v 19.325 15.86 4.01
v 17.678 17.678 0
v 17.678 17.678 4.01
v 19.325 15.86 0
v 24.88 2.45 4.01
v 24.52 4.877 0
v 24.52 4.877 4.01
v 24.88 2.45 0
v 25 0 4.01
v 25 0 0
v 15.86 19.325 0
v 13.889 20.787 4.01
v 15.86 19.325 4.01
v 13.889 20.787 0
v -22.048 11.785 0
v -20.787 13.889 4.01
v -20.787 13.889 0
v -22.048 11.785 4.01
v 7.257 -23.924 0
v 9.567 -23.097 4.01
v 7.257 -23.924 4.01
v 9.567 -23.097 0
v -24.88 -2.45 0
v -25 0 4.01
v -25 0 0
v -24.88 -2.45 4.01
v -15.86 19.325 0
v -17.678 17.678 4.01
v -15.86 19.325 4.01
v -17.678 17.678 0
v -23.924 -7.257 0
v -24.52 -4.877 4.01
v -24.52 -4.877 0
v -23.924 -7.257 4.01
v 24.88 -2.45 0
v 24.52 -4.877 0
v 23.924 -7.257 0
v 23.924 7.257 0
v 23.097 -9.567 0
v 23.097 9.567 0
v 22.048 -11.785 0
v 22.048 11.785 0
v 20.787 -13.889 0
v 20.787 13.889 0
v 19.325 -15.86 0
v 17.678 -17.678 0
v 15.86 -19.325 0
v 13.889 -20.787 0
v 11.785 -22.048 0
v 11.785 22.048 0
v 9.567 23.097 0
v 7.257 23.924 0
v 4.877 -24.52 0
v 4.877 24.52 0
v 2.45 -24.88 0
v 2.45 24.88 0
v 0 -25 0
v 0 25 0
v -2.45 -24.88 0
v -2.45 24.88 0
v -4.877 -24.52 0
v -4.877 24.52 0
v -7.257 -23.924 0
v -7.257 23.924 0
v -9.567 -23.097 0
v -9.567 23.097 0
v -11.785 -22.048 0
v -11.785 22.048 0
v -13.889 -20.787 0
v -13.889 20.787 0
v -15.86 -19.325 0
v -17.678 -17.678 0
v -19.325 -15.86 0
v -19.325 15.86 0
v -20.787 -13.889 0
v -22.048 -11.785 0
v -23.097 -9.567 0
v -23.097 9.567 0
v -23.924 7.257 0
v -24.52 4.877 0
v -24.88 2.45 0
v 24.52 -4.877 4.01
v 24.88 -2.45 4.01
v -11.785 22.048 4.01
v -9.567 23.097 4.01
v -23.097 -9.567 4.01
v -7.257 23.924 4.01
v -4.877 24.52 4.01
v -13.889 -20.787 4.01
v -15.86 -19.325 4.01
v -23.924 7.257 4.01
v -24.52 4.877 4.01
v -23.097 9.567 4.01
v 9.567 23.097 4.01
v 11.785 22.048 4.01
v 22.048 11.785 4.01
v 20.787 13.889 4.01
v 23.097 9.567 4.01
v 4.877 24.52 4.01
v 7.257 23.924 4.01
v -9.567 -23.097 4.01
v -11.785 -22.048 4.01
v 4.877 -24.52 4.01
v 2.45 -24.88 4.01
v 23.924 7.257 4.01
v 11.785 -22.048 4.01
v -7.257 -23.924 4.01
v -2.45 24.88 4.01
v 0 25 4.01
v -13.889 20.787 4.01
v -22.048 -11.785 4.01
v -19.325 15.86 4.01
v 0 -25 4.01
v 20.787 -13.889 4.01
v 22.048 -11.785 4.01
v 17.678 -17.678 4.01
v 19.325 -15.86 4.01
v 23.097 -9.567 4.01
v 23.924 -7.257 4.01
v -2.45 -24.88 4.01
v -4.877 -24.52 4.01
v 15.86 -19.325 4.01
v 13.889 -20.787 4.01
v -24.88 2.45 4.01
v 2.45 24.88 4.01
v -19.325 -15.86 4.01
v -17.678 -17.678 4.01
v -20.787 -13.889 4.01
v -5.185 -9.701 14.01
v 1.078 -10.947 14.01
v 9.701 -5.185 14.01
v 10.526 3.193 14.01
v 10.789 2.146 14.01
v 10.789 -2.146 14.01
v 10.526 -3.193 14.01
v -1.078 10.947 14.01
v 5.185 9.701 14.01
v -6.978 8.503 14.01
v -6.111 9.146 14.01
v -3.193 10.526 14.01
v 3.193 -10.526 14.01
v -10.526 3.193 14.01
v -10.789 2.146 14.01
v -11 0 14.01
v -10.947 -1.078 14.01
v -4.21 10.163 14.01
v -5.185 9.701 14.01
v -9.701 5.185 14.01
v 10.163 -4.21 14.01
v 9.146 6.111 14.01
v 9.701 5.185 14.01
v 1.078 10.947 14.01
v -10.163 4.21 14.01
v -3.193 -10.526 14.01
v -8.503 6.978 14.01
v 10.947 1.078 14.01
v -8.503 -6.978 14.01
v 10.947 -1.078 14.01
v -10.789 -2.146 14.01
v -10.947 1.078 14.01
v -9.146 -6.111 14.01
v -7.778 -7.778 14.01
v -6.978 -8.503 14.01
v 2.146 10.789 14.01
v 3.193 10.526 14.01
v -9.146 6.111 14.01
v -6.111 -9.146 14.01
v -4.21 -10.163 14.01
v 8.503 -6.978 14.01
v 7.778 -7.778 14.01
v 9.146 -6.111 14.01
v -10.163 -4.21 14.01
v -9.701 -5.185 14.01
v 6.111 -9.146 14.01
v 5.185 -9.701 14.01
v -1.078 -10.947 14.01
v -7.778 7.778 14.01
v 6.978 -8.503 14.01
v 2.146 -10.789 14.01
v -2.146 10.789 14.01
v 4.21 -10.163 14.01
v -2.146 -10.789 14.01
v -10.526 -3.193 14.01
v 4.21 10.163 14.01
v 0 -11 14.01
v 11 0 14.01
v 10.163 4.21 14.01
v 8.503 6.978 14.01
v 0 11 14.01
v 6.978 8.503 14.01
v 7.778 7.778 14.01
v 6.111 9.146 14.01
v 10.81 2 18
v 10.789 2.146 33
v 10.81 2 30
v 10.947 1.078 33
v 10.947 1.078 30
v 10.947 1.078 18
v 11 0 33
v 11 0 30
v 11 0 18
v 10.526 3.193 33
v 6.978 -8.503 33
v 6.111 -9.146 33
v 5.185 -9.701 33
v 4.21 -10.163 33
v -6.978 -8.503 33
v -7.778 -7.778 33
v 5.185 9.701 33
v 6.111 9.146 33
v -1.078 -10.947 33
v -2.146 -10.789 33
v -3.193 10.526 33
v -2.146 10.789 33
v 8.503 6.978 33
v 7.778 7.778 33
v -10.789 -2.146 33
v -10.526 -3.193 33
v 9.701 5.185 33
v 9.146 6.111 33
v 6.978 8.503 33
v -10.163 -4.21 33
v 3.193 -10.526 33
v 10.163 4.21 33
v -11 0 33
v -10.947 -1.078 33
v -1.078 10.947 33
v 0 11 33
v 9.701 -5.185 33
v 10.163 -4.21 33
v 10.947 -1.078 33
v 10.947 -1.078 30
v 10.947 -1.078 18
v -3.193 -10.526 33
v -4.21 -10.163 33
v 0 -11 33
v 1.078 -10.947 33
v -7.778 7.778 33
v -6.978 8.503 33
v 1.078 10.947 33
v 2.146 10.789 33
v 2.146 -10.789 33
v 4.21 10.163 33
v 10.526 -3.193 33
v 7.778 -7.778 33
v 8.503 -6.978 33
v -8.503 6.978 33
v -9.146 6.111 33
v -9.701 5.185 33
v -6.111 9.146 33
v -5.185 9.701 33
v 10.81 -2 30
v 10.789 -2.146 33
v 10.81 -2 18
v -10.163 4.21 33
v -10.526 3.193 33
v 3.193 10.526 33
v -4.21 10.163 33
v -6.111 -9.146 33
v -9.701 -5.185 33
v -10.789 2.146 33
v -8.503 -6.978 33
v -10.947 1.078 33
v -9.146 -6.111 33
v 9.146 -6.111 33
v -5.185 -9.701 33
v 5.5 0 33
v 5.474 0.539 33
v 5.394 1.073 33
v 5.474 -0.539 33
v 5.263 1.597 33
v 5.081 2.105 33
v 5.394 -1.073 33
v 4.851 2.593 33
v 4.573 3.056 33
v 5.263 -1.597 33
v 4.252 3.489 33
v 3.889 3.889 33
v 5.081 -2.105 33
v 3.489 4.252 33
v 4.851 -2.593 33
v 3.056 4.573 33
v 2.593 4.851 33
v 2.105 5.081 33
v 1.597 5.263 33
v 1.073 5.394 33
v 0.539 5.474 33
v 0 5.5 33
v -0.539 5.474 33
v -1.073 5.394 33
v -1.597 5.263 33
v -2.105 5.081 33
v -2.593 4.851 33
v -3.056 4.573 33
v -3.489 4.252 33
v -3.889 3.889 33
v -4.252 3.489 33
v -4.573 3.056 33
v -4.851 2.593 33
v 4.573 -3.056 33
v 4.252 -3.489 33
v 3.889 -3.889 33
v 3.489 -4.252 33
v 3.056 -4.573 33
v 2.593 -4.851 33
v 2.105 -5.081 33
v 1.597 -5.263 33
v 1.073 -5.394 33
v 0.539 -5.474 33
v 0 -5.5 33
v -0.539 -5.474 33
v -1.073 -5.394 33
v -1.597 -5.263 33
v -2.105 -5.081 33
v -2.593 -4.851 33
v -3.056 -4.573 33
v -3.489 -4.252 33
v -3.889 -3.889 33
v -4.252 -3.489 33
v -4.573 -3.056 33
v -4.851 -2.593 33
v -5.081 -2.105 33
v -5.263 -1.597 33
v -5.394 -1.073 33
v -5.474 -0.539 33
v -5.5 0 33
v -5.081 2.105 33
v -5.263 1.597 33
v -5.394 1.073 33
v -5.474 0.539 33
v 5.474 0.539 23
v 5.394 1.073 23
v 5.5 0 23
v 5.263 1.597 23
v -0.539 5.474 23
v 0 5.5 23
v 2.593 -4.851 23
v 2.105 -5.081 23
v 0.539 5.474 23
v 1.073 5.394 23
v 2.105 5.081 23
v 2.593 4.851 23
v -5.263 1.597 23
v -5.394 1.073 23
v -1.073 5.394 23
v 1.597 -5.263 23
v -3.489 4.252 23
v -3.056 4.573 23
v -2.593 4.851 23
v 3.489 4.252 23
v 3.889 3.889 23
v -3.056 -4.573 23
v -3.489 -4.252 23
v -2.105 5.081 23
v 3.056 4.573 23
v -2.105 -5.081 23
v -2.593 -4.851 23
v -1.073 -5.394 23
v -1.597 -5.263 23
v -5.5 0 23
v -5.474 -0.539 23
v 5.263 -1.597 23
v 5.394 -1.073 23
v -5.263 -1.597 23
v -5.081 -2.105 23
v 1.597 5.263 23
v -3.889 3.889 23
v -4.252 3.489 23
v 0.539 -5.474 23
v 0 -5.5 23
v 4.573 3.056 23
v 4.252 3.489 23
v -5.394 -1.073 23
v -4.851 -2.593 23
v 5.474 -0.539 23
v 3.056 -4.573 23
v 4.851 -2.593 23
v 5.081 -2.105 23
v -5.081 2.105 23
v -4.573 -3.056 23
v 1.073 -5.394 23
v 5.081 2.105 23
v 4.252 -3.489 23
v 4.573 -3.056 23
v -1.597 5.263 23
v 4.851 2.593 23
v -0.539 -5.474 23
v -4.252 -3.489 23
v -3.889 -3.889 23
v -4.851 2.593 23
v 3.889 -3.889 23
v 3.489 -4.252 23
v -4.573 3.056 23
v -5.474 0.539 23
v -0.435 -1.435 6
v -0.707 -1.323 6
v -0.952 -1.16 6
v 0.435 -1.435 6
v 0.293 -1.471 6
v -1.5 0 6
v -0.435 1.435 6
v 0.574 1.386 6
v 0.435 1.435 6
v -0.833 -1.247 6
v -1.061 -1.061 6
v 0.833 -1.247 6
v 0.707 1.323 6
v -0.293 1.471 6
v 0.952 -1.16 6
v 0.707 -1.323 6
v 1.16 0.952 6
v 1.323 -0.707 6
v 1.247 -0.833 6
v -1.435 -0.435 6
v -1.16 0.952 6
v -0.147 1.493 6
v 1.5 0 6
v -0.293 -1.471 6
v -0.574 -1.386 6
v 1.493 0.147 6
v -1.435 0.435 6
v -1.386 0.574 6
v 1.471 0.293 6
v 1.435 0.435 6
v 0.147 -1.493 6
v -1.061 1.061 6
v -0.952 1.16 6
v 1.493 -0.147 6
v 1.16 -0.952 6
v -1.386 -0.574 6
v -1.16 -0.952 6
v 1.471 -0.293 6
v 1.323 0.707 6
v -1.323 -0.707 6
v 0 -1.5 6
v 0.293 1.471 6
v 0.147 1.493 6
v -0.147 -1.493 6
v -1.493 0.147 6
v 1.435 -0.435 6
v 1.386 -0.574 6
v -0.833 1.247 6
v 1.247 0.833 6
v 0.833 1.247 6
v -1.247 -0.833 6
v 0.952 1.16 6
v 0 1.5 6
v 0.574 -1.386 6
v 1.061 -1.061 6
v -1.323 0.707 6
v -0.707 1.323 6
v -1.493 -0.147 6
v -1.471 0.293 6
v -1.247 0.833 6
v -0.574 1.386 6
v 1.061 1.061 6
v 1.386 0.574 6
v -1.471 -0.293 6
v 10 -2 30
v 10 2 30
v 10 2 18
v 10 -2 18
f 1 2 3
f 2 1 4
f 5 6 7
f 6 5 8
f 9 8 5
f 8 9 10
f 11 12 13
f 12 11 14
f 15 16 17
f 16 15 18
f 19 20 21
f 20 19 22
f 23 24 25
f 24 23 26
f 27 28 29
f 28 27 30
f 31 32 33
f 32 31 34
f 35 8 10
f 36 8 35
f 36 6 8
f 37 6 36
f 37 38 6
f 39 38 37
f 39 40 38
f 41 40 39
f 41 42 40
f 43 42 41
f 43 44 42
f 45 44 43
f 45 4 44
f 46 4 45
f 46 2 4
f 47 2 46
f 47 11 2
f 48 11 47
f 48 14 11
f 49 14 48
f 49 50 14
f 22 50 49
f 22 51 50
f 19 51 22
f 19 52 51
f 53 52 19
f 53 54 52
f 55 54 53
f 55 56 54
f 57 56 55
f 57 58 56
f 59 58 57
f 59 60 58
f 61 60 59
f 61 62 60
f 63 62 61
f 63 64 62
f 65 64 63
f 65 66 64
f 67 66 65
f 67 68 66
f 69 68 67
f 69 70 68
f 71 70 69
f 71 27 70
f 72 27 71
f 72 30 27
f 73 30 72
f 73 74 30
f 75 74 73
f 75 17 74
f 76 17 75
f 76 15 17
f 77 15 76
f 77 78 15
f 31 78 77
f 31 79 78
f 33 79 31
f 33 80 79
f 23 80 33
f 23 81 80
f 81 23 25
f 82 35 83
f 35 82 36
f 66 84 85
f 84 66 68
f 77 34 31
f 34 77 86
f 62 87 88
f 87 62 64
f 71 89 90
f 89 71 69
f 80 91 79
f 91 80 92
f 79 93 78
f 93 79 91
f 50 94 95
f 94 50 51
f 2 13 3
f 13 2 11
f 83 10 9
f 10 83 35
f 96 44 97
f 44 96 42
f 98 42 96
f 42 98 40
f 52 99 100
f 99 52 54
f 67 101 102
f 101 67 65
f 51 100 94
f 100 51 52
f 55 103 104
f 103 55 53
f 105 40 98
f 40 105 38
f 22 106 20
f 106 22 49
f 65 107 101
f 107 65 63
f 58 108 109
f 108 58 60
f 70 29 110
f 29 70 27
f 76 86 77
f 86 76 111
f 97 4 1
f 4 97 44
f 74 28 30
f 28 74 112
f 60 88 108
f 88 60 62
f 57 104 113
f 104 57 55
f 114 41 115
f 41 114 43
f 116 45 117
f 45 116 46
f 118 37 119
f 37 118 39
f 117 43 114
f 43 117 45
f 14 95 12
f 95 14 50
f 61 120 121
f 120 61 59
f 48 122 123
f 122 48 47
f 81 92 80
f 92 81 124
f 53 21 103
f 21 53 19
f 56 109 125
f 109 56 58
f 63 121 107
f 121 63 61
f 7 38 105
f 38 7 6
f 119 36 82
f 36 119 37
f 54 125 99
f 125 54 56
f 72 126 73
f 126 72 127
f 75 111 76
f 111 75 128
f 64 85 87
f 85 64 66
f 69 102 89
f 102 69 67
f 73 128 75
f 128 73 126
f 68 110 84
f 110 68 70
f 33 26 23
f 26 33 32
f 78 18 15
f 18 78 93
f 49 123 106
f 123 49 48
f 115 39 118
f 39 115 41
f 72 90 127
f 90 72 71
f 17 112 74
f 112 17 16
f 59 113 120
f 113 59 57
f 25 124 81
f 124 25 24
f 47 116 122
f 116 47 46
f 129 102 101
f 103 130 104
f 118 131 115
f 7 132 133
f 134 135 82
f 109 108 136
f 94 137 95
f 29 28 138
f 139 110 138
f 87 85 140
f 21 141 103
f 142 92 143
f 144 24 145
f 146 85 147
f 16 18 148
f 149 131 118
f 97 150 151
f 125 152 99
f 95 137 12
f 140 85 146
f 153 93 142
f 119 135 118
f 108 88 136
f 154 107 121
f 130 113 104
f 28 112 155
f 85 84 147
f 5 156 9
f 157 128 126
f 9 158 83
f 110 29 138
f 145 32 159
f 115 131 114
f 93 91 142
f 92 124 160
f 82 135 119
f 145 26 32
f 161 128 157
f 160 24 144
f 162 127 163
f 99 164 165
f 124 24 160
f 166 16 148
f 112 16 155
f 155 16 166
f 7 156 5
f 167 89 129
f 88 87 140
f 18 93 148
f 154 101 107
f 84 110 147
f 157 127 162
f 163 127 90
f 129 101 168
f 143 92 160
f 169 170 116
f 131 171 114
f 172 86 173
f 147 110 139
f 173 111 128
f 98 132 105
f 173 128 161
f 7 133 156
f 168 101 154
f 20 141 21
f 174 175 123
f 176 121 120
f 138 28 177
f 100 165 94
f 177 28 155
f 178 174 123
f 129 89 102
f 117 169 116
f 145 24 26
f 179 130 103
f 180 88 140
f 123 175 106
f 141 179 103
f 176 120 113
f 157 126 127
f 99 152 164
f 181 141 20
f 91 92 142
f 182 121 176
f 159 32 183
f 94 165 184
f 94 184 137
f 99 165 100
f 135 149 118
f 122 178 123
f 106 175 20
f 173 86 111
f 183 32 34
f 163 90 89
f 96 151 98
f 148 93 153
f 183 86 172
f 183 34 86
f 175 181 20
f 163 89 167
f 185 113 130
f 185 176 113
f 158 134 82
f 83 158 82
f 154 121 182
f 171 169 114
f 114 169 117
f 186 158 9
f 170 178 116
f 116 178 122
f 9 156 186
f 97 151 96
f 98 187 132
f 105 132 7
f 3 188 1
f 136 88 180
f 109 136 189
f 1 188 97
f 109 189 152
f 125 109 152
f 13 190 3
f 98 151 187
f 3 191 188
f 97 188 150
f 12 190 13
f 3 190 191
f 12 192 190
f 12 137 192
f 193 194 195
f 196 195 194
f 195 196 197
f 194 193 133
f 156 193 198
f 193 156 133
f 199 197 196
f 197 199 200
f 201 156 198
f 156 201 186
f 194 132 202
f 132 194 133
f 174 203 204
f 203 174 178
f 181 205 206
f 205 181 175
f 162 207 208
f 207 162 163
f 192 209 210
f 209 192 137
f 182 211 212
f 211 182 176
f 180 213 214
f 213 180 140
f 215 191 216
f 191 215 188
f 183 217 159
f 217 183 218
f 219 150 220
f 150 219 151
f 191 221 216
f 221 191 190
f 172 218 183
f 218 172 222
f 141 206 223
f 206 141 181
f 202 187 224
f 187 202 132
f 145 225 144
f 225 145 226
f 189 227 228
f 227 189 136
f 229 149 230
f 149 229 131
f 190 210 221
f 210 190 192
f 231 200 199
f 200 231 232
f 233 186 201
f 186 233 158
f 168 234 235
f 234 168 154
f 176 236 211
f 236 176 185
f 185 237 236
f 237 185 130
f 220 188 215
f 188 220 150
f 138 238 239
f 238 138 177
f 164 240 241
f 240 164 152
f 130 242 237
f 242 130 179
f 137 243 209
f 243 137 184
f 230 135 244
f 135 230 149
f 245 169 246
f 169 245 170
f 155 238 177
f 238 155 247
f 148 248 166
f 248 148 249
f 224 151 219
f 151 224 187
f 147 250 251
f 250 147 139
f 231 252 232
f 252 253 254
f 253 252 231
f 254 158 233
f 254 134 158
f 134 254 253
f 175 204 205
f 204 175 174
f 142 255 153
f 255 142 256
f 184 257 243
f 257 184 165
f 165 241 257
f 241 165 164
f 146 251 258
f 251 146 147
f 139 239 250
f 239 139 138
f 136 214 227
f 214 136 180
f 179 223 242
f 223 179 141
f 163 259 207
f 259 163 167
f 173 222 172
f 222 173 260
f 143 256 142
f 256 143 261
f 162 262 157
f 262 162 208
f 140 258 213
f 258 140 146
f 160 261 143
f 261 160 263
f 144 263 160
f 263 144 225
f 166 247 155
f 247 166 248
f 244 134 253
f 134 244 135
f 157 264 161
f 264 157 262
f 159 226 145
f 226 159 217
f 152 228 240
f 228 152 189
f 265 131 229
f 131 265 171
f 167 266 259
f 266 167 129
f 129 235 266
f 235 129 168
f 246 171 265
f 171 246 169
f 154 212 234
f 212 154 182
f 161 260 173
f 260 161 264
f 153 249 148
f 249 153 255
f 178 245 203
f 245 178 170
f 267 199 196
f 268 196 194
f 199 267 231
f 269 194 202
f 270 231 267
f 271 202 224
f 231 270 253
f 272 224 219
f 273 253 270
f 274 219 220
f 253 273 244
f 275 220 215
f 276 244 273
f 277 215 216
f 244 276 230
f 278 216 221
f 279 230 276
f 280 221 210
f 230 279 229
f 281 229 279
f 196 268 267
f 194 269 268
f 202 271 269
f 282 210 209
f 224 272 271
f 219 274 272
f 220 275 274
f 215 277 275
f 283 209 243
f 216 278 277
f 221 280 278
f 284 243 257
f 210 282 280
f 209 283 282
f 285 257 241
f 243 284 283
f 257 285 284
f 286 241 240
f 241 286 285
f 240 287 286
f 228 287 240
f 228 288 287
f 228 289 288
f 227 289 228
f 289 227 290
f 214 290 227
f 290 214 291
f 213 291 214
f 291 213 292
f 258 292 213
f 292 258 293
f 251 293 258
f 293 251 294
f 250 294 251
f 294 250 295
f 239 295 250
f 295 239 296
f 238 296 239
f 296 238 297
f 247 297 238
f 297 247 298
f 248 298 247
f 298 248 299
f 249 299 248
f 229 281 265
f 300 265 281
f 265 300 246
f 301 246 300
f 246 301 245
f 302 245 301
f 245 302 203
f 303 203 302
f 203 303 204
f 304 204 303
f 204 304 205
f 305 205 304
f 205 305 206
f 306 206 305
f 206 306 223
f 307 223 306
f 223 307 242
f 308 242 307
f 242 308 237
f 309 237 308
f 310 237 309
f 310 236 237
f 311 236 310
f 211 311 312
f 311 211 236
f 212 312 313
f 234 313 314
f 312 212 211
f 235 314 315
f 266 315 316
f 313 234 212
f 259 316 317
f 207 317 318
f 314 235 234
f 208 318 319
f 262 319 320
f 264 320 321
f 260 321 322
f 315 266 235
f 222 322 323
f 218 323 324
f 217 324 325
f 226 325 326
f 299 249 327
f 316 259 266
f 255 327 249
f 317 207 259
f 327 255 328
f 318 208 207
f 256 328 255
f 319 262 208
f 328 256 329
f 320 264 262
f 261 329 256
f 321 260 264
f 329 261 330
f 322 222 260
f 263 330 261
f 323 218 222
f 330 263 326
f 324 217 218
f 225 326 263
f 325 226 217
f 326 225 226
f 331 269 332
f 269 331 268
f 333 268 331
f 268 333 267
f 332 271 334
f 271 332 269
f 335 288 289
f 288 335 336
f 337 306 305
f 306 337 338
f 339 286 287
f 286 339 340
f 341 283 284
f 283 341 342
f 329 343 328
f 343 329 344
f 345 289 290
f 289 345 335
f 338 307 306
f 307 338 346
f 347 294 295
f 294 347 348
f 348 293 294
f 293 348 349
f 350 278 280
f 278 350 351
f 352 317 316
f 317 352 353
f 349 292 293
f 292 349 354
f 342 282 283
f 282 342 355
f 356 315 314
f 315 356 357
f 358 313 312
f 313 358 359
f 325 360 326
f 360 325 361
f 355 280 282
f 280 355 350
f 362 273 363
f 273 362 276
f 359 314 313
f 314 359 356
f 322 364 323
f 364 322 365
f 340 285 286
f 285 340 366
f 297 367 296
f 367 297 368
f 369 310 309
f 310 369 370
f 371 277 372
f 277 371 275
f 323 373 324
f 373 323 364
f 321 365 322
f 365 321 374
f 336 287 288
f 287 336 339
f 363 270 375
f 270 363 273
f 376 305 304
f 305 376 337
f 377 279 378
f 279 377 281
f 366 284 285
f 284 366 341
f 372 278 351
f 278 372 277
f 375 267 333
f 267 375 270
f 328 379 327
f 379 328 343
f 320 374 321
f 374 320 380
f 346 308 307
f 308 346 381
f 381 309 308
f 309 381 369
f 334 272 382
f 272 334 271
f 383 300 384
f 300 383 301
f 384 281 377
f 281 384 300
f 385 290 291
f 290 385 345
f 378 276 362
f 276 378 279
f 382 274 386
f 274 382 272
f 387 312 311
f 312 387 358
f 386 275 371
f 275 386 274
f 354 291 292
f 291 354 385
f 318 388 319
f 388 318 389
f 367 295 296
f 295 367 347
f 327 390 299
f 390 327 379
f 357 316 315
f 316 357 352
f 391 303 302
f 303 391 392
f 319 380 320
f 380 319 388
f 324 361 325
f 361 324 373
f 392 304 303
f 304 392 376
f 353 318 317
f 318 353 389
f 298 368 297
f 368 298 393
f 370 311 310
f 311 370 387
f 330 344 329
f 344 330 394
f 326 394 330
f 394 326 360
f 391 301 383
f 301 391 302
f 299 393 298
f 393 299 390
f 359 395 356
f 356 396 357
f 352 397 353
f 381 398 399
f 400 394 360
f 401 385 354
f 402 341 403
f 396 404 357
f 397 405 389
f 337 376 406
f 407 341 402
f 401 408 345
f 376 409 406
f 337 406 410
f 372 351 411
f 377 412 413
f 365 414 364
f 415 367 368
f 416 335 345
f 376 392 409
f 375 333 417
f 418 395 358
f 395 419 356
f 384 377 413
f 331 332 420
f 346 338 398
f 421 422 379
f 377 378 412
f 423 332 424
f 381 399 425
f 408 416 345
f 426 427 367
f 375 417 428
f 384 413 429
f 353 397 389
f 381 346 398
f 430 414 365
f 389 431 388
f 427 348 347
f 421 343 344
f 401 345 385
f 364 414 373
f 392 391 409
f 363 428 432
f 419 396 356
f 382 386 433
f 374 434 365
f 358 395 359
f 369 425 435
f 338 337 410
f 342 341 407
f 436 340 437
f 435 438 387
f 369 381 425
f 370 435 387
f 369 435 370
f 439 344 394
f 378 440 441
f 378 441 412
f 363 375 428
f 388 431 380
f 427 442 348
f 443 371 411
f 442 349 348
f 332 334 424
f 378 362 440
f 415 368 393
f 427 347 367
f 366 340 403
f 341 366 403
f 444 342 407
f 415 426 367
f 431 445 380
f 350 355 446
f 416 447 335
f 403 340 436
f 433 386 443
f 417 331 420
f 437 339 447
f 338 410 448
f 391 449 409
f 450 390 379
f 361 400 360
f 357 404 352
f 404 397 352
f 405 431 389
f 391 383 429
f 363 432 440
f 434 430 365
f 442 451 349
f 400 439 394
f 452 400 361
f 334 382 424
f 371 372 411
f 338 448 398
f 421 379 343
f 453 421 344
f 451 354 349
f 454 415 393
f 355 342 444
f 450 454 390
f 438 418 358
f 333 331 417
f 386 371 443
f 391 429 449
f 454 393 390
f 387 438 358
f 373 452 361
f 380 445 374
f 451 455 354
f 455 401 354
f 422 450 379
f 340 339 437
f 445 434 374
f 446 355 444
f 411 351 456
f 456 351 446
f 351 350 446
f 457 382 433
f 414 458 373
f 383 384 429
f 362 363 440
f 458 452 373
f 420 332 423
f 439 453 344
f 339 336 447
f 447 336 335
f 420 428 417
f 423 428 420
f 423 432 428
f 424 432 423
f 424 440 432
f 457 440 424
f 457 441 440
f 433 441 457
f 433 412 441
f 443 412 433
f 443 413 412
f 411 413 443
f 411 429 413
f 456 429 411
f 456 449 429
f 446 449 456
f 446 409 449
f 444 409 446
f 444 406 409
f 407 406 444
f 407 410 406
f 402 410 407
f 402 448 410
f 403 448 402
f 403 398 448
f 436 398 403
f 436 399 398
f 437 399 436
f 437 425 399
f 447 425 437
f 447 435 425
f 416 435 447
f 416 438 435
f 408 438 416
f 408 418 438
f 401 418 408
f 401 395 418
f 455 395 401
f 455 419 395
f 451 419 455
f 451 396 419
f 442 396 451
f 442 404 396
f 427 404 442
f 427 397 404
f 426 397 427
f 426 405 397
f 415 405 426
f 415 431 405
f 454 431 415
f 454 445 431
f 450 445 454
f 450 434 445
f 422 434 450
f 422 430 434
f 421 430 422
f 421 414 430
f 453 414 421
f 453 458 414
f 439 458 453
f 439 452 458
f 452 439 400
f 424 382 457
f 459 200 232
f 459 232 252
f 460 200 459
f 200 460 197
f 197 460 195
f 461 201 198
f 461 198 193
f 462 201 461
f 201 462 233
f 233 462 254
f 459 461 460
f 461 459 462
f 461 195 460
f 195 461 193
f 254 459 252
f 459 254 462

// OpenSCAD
// --- Dimensions ---
base_diameter = 50;          // Diameter of the base disc
base_height = 4;            // Height of the base disc
cone_bottom_dia = 50;       // Diameter at the bottom of the cone (z=4)
cone_top_dia = 22;          // Diameter at the top of the cone (z=14)
cone_height = 10;           // Height of the cone section (14 - 4)
column_diameter = 22;       // Diameter of the upper column
column_height = 19;         // Height of the column (33 - 14)
total_height = 33;          // Total height of the stand

// Tube Seat Dimensions
seat_top_dia = 11;          // Diameter of the cylindrical seat
seat_top_z = 33;            // Z-coordinate at the top of the seat
seat_bottom_z = 23;         // Z-coordinate where seat becomes conical
seat_cone_bottom_dia = 3;   // Diameter at the tip of the internal cone
seat_cone_bottom_z = 6;     // Z-coordinate at the tip of the internal cone

// Viewing Window Dimensions
window_width_y = 4;         // Width of the window in Y direction
window_height_start = 18;   // Z-coordinate at bottom of window
window_height_end = 30;     // Z-coordinate at top of window
window_thickness_offset = 10; // Extra depth to ensure clean cut through walls

// --- Parameters ---
$fn = 64;

// --- Main Construction ---

difference() {
    // The Solid Body
    union() {
        // 1. Base Disc (z=0 to 4)
        cylinder(d = base_diameter, h = base_height);

        // 2. Conical Section (z=4 to z=14)
        hull() {
            translate([0, 0, base_height])
                cylinder(d = cone_bottom_dia, h = 0.01);
            translate([0, 0, base_height + cone_height])
                cylinder(d = cone_top_dia, h = 0.01);
        }

        // 3. Upper Column (z=14 to z=33)
        translate([0, 0, base_height + cone_height])
            cylinder(d = column_diameter, h = column_height);
    }

    // --- Subtraction (Holes) ---

    // 1. The Tube Seat (Internal Cavity)
    // The specification states: "below z=6 the stand is solid".
    // The previous error was a hole being present at z=2.00.
    // We must ensure the subtraction stops at z=6.
    union() {
        // Cylindrical part of the seat (z=23 to z=33)
        translate([0, 0, seat_bottom_z])
            cylinder(d = seat_top_dia, h = seat_top_z - seat_bottom_z + 0.1);
        
        // Conical part of the seat (z=6 to z=23)
        hull() {
            translate([0, 0, seat_bottom_z])
                cylinder(d = seat_top_dia, h = 0.01);
            translate([0, 0, seat_cone_bottom_z])
                cylinder(d = seat_cone_bottom_dia, h = 0.01);
        }
        
        // We do NOT extend the subtraction below z=6 to keep the base solid.
    }

    // 2. Viewing Window
    // Cut through the +X side.
    // The window is 4mm wide in Y, centered on Y=0.
    // It must cut from the seat (z=18) to the outside.
    // We use a large X translation to ensure it clears the entire radius.
    translate([column_diameter/2 - 1, -window_width_y/2, window_height_start])
        cube([window_thickness_offset + 2, window_width_y, window_height_end - window_height_start]);
}
